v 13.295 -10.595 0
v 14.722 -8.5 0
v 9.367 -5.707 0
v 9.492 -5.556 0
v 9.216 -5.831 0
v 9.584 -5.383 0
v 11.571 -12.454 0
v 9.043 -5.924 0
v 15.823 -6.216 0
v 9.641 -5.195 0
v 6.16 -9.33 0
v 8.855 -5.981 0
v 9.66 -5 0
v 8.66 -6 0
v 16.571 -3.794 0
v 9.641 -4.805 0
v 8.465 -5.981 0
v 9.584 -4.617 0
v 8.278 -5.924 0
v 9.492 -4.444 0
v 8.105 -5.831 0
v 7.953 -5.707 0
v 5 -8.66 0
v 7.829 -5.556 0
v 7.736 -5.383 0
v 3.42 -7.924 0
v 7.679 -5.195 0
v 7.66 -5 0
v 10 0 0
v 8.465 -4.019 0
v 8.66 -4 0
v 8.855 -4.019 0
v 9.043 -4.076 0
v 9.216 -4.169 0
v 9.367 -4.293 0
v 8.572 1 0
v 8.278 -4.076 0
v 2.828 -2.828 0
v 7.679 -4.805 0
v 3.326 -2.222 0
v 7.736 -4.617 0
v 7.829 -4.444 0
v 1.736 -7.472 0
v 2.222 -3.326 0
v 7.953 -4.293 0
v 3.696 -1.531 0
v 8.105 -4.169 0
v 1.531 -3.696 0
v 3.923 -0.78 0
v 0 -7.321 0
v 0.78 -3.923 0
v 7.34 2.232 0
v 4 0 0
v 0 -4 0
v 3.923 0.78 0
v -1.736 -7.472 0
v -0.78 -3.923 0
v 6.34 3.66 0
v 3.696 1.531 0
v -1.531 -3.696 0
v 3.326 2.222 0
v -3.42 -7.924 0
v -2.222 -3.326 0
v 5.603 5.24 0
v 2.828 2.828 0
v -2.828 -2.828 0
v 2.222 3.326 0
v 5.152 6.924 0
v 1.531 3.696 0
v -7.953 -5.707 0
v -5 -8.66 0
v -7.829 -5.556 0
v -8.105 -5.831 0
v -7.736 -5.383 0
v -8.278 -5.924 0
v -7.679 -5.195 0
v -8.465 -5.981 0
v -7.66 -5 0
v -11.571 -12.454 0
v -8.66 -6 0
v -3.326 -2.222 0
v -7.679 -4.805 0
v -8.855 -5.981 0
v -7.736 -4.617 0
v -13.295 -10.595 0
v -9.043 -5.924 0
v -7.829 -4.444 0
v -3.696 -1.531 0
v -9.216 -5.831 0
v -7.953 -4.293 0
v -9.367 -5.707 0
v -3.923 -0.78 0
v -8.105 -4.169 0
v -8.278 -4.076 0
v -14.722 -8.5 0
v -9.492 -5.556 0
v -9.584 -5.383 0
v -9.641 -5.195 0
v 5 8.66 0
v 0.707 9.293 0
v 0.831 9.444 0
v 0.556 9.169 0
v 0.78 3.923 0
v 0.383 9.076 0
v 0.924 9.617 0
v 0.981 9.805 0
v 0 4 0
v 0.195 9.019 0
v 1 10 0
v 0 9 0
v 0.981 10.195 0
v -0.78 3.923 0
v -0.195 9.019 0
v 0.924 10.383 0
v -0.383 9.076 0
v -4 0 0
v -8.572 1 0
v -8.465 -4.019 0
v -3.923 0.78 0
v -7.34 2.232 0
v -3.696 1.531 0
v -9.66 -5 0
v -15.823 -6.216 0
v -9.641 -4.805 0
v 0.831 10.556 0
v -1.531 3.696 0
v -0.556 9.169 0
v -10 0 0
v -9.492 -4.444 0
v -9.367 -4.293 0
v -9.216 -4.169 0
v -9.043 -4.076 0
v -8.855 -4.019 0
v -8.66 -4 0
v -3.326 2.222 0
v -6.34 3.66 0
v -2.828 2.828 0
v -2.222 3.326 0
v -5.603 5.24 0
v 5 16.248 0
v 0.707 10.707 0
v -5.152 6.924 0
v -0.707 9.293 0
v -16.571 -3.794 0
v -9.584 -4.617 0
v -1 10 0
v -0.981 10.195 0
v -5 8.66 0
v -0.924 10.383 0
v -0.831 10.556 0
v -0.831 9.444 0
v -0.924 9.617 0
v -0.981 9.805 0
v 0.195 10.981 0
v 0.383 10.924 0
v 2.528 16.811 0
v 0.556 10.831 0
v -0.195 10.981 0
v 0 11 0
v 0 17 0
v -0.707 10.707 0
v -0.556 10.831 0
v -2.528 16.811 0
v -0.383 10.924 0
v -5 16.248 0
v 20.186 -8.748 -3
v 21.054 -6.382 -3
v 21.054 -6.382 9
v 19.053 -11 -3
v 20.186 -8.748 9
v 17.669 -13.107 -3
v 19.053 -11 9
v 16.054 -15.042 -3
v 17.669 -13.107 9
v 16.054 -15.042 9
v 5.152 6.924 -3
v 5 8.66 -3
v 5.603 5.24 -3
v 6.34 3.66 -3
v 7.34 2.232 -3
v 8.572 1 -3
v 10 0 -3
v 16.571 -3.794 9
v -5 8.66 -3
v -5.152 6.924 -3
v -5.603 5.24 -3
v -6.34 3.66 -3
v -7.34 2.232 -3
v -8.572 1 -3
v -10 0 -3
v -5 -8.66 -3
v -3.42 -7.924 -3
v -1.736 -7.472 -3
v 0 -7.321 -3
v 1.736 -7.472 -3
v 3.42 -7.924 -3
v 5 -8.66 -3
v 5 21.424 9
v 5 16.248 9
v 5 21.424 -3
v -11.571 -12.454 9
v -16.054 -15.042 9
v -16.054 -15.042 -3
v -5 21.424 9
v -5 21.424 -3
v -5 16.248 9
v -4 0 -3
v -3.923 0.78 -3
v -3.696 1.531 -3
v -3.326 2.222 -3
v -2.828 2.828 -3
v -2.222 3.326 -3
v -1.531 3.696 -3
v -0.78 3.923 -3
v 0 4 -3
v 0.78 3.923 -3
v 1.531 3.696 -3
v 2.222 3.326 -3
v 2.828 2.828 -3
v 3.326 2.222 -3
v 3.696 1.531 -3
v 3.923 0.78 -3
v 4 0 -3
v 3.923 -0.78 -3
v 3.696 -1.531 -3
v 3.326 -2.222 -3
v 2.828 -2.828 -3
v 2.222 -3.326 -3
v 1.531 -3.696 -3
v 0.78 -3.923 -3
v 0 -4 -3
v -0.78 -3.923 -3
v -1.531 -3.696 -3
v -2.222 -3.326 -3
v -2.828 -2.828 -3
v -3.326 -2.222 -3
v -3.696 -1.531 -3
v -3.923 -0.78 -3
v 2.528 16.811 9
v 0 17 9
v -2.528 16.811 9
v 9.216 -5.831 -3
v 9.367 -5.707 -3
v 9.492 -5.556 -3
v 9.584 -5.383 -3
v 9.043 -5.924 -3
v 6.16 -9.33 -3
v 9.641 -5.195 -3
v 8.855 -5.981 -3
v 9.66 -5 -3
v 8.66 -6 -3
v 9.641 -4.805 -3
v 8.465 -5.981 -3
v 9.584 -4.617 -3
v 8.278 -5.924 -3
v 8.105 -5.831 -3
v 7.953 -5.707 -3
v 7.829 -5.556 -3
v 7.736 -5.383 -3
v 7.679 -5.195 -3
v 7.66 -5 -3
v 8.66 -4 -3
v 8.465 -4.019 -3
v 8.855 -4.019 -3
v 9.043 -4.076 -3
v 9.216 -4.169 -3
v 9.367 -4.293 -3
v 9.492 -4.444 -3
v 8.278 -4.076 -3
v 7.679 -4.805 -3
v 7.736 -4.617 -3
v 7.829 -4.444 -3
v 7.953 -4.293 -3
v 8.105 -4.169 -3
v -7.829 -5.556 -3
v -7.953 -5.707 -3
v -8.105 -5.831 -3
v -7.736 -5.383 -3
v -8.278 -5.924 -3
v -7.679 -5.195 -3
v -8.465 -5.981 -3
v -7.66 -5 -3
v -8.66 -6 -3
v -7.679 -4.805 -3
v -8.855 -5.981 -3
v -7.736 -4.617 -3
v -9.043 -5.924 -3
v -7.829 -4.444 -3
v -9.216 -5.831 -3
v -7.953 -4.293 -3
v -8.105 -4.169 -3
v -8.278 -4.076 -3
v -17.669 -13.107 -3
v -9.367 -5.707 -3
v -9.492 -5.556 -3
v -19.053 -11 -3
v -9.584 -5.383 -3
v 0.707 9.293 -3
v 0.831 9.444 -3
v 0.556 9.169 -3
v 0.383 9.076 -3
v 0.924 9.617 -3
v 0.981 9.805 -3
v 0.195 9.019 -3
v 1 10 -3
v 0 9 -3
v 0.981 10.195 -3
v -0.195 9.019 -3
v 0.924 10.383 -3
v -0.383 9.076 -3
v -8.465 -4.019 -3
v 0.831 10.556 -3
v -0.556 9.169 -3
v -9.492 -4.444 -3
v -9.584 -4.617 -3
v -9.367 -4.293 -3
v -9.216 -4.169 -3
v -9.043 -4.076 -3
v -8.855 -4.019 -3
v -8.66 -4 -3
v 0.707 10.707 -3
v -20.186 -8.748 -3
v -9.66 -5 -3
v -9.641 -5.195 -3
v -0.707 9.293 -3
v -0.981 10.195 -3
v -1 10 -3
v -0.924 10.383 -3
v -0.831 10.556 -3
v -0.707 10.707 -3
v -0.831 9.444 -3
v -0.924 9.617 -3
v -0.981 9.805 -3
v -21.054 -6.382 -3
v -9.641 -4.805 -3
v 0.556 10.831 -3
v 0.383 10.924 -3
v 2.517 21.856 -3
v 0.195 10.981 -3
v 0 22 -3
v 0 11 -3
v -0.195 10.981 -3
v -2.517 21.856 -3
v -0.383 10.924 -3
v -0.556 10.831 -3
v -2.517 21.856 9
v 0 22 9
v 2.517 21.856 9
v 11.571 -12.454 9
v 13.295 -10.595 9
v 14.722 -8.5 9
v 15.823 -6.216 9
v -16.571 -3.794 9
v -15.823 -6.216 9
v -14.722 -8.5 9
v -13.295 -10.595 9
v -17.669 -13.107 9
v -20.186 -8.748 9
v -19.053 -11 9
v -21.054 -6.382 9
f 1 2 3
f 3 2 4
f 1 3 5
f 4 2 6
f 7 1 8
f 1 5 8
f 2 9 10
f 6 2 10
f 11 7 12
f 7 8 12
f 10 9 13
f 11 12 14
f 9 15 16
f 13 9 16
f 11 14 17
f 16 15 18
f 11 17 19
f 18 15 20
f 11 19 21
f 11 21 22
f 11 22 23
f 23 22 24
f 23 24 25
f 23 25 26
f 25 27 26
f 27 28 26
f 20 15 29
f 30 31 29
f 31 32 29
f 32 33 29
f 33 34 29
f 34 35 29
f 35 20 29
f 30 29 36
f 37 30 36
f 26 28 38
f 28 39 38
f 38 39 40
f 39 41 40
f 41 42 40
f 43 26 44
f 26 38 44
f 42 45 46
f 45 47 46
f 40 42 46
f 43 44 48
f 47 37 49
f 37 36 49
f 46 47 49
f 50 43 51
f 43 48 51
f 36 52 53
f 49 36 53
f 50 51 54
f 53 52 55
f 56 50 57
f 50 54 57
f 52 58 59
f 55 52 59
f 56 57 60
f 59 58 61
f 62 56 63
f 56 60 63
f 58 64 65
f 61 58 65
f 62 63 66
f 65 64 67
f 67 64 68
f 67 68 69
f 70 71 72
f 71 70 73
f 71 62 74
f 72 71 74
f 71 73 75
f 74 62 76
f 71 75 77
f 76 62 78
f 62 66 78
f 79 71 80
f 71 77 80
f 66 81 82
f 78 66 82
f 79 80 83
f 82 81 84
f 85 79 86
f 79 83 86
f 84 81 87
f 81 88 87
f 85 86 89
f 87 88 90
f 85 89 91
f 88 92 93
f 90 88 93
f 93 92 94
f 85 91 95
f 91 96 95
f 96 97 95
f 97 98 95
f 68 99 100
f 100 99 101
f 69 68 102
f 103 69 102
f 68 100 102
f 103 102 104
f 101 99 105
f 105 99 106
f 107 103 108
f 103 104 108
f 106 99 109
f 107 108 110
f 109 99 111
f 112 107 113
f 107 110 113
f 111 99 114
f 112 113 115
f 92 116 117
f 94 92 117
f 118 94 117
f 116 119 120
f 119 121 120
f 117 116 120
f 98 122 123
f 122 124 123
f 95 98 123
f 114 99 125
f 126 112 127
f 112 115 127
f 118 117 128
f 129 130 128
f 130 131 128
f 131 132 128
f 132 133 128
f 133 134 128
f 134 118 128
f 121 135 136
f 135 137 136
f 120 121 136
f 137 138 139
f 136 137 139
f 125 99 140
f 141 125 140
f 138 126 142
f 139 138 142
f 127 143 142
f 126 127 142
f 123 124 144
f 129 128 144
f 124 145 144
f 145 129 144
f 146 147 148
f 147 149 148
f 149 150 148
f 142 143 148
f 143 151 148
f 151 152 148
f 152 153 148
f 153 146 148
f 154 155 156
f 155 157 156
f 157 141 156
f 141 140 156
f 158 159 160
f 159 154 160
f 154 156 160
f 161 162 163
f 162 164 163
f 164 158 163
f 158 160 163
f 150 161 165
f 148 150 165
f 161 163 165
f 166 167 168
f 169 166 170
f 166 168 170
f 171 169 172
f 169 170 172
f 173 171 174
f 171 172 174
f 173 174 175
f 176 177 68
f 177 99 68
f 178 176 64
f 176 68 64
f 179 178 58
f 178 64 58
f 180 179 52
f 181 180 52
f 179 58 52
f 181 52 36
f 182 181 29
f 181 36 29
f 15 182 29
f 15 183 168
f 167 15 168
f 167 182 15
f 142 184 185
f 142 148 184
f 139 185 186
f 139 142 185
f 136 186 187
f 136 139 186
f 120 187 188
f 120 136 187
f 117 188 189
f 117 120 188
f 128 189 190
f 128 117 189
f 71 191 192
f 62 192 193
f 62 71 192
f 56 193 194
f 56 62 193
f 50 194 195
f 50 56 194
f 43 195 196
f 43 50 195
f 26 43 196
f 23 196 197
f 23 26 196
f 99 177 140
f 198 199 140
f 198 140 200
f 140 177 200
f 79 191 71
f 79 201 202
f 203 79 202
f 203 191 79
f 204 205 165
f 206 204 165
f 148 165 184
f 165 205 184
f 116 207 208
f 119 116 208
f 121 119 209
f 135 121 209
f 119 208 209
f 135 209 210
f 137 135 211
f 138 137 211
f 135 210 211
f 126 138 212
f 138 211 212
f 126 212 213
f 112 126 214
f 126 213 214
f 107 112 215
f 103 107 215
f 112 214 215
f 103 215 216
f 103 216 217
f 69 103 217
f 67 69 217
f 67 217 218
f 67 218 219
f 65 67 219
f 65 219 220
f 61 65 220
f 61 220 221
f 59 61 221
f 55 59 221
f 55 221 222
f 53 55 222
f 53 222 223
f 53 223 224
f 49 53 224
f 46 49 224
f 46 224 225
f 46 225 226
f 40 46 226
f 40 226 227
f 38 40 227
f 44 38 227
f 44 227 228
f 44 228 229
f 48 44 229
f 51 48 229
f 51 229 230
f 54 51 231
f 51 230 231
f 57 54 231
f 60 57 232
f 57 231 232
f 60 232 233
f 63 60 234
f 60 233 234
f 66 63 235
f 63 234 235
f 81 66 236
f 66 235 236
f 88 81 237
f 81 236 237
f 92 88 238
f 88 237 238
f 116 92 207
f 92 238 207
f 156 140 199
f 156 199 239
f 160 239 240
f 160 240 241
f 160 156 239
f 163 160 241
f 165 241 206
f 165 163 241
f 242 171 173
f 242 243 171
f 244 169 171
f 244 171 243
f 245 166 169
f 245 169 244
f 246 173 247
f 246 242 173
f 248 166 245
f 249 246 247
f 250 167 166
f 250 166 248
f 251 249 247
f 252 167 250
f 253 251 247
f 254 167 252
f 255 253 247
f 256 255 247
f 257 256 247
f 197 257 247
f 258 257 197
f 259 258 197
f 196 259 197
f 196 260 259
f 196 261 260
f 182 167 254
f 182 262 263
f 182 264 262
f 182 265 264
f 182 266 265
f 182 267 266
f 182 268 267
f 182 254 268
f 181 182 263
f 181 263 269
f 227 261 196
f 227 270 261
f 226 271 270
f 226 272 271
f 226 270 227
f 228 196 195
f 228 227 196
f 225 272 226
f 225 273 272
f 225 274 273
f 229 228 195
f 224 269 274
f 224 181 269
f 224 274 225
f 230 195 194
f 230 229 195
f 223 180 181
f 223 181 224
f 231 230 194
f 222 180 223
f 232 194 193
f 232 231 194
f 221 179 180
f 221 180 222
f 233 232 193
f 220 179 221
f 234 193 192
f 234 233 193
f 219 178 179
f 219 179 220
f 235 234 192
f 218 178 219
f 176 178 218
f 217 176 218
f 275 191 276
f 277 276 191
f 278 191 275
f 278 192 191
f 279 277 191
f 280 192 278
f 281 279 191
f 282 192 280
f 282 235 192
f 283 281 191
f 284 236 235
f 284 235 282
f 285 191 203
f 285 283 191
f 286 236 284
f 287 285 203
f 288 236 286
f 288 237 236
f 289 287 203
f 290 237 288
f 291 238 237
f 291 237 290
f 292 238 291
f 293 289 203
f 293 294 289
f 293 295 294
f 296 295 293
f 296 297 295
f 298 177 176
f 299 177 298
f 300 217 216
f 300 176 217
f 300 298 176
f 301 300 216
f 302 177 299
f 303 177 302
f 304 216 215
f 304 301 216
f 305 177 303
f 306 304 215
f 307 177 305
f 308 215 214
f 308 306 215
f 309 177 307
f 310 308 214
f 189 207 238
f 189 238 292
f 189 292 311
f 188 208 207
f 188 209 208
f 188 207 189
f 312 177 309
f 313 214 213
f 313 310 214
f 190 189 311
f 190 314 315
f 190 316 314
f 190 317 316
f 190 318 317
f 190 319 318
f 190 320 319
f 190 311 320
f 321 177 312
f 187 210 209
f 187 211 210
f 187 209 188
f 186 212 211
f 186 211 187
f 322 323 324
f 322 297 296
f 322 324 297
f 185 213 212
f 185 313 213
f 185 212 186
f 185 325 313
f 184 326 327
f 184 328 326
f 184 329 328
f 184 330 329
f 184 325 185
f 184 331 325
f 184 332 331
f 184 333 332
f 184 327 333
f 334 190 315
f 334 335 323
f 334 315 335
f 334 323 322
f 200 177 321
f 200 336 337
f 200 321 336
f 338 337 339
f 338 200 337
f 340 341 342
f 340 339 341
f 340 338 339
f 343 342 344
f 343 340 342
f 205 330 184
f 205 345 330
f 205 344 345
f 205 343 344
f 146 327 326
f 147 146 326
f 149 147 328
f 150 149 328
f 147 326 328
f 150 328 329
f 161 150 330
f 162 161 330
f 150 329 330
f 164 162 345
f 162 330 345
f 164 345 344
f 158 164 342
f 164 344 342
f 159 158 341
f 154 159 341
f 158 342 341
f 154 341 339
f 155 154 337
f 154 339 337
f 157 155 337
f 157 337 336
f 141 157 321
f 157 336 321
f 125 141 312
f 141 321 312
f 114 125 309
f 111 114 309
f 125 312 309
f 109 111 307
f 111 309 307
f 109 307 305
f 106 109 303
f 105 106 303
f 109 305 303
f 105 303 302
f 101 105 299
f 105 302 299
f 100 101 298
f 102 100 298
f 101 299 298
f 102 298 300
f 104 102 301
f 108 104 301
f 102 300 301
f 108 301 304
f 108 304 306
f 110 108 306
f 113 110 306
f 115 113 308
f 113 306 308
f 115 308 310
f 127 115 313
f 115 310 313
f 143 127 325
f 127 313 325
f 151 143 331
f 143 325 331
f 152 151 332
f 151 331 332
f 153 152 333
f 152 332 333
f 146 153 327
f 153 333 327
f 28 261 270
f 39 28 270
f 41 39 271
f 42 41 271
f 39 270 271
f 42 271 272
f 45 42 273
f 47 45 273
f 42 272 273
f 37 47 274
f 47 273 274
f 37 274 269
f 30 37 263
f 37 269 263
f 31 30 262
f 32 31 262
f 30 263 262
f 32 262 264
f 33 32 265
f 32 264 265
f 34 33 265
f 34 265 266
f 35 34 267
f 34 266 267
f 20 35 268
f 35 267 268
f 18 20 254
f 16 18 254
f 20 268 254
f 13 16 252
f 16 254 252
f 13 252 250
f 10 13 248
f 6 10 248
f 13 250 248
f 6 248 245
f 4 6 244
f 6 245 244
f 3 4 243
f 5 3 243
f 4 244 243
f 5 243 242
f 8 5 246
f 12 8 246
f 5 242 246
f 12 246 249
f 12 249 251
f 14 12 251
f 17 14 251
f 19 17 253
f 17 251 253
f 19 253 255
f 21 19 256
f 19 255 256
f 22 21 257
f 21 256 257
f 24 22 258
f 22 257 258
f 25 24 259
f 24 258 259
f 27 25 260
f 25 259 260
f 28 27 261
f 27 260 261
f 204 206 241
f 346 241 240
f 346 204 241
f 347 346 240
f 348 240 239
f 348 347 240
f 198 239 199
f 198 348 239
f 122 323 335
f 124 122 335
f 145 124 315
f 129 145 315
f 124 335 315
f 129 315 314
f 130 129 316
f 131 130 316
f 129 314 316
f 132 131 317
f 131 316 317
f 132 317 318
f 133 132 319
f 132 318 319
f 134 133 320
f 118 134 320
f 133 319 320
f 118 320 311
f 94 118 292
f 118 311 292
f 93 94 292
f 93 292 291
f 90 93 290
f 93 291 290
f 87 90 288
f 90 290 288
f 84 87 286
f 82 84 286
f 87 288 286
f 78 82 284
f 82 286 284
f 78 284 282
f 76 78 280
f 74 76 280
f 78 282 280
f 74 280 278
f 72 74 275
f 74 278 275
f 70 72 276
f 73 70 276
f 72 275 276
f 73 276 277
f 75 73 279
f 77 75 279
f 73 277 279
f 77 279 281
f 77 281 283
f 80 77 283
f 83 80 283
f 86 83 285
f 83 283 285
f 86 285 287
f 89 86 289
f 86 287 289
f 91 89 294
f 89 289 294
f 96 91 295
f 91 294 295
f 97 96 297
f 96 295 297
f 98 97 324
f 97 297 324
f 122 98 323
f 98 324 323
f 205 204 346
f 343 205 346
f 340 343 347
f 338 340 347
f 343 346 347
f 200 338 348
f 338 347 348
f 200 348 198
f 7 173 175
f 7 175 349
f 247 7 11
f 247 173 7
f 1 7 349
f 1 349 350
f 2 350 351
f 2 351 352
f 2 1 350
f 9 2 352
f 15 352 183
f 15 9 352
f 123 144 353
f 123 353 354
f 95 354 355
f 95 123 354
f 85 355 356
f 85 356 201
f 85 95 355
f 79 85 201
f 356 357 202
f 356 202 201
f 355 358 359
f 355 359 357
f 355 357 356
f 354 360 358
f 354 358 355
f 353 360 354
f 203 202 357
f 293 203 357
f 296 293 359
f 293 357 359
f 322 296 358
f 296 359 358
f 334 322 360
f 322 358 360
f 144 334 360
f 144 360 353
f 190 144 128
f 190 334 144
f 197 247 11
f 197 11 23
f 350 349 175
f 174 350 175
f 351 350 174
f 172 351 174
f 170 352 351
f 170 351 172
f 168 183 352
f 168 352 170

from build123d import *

# Parameters (mm, degrees)
SKETCH_1_R          = 22
SKETCH_1_R_2        = 17
EXTRUDE_1_DEPTH     = 9
SKETCH_2_R          = 22
EXTRUDE_2_DEPTH     = 3
SKETCH_3_R          = 1
CUT_EXTRUDE_1_DEPTH = 3
CUT_EXTRUDE_2_DEPTH = 25
SKETCH_5_R          = 4
CUT_EXTRUDE_3_DEPTH = 10
FILLET_1_R          = 10
FILLET_2_R          = 10


with BuildPart() as part:
    # 草图1 → 凸台-拉伸1 (new body)
    with BuildSketch(Plane.XY):
        Circle(SKETCH_1_R)
        Circle(SKETCH_1_R_2, mode=Mode.SUBTRACT)
    extrude(amount=EXTRUDE_1_DEPTH)

    # 草图2 → 凸台-拉伸2 (add)
    with BuildSketch(Plane(origin=(0, 0, 0), x_dir=(-1, 0, 0), z_dir=(0, 0, -1))):
        Circle(SKETCH_2_R)
    extrude(amount=EXTRUDE_2_DEPTH)

    # 草图3 → 切除-拉伸1 (cut)
    with BuildSketch(Plane(origin=(0, 0, -3), x_dir=(-1, 0, 0), z_dir=(0, 0, -1))):
        with Locations((0, 10)):
            Circle(SKETCH_3_R)
        with Locations((8.660254038, -5)):
            Circle(SKETCH_3_R)
        with Locations((-8.660254038, -5)):
            Circle(SKETCH_3_R)
    extrude(amount=-CUT_EXTRUDE_1_DEPTH, mode=Mode.SUBTRACT)

    # 草图4 → 切除-拉伸2 (cut)
    with BuildSketch(Plane(origin=(0, 0, -3), x_dir=(-1, 0, 0), z_dir=(0, 0, -1))):
        Polygon((24.787699458, -8.537682263), (5, 2.886751346), (5, 15), (5, 31.006622637), (28.596284234, 19.54376122), align=None)
        Polygon((-6.160254038, -9.330127019), (0, -5.773502692), (19.787699458, -17.197936301), (-4.03507969, -32.43608202), (-23.902747272, -19.573760264), align=None)
        Polygon((-5, 10), (-5, 2.886751346), (-28.902747272, -10.913506226), (-27.638085306, 27.170625695), (-5, 31.006622637), align=None)
    extrude(amount=-CUT_EXTRUDE_2_DEPTH, mode=Mode.SUBTRACT)

    # 草图5 → 切除-拉伸3 (cut)
    with BuildSketch(Plane(origin=(0, 0, -3), x_dir=(-1, 0, 0), z_dir=(0, 0, -1))):
        Circle(SKETCH_5_R)
    extrude(amount=-CUT_EXTRUDE_3_DEPTH, mode=Mode.SUBTRACT)

    # 圆角1
    fillet_1_edges = [part.edges().sort_by_distance(p)[0] for p in [
        (-5, 2.886751346, -1.5),
    ]]
    fillet(fillet_1_edges, radius=FILLET_1_R)

    # 圆角2
    fillet_2_edges = [part.edges().sort_by_distance(p)[0] for p in [
        (5, 2.886751346, -1.5),
        (0, -5.773502692, -1.5),
    ]]
    fillet(fillet_2_edges, radius=FILLET_2_R)


solid = part.part
